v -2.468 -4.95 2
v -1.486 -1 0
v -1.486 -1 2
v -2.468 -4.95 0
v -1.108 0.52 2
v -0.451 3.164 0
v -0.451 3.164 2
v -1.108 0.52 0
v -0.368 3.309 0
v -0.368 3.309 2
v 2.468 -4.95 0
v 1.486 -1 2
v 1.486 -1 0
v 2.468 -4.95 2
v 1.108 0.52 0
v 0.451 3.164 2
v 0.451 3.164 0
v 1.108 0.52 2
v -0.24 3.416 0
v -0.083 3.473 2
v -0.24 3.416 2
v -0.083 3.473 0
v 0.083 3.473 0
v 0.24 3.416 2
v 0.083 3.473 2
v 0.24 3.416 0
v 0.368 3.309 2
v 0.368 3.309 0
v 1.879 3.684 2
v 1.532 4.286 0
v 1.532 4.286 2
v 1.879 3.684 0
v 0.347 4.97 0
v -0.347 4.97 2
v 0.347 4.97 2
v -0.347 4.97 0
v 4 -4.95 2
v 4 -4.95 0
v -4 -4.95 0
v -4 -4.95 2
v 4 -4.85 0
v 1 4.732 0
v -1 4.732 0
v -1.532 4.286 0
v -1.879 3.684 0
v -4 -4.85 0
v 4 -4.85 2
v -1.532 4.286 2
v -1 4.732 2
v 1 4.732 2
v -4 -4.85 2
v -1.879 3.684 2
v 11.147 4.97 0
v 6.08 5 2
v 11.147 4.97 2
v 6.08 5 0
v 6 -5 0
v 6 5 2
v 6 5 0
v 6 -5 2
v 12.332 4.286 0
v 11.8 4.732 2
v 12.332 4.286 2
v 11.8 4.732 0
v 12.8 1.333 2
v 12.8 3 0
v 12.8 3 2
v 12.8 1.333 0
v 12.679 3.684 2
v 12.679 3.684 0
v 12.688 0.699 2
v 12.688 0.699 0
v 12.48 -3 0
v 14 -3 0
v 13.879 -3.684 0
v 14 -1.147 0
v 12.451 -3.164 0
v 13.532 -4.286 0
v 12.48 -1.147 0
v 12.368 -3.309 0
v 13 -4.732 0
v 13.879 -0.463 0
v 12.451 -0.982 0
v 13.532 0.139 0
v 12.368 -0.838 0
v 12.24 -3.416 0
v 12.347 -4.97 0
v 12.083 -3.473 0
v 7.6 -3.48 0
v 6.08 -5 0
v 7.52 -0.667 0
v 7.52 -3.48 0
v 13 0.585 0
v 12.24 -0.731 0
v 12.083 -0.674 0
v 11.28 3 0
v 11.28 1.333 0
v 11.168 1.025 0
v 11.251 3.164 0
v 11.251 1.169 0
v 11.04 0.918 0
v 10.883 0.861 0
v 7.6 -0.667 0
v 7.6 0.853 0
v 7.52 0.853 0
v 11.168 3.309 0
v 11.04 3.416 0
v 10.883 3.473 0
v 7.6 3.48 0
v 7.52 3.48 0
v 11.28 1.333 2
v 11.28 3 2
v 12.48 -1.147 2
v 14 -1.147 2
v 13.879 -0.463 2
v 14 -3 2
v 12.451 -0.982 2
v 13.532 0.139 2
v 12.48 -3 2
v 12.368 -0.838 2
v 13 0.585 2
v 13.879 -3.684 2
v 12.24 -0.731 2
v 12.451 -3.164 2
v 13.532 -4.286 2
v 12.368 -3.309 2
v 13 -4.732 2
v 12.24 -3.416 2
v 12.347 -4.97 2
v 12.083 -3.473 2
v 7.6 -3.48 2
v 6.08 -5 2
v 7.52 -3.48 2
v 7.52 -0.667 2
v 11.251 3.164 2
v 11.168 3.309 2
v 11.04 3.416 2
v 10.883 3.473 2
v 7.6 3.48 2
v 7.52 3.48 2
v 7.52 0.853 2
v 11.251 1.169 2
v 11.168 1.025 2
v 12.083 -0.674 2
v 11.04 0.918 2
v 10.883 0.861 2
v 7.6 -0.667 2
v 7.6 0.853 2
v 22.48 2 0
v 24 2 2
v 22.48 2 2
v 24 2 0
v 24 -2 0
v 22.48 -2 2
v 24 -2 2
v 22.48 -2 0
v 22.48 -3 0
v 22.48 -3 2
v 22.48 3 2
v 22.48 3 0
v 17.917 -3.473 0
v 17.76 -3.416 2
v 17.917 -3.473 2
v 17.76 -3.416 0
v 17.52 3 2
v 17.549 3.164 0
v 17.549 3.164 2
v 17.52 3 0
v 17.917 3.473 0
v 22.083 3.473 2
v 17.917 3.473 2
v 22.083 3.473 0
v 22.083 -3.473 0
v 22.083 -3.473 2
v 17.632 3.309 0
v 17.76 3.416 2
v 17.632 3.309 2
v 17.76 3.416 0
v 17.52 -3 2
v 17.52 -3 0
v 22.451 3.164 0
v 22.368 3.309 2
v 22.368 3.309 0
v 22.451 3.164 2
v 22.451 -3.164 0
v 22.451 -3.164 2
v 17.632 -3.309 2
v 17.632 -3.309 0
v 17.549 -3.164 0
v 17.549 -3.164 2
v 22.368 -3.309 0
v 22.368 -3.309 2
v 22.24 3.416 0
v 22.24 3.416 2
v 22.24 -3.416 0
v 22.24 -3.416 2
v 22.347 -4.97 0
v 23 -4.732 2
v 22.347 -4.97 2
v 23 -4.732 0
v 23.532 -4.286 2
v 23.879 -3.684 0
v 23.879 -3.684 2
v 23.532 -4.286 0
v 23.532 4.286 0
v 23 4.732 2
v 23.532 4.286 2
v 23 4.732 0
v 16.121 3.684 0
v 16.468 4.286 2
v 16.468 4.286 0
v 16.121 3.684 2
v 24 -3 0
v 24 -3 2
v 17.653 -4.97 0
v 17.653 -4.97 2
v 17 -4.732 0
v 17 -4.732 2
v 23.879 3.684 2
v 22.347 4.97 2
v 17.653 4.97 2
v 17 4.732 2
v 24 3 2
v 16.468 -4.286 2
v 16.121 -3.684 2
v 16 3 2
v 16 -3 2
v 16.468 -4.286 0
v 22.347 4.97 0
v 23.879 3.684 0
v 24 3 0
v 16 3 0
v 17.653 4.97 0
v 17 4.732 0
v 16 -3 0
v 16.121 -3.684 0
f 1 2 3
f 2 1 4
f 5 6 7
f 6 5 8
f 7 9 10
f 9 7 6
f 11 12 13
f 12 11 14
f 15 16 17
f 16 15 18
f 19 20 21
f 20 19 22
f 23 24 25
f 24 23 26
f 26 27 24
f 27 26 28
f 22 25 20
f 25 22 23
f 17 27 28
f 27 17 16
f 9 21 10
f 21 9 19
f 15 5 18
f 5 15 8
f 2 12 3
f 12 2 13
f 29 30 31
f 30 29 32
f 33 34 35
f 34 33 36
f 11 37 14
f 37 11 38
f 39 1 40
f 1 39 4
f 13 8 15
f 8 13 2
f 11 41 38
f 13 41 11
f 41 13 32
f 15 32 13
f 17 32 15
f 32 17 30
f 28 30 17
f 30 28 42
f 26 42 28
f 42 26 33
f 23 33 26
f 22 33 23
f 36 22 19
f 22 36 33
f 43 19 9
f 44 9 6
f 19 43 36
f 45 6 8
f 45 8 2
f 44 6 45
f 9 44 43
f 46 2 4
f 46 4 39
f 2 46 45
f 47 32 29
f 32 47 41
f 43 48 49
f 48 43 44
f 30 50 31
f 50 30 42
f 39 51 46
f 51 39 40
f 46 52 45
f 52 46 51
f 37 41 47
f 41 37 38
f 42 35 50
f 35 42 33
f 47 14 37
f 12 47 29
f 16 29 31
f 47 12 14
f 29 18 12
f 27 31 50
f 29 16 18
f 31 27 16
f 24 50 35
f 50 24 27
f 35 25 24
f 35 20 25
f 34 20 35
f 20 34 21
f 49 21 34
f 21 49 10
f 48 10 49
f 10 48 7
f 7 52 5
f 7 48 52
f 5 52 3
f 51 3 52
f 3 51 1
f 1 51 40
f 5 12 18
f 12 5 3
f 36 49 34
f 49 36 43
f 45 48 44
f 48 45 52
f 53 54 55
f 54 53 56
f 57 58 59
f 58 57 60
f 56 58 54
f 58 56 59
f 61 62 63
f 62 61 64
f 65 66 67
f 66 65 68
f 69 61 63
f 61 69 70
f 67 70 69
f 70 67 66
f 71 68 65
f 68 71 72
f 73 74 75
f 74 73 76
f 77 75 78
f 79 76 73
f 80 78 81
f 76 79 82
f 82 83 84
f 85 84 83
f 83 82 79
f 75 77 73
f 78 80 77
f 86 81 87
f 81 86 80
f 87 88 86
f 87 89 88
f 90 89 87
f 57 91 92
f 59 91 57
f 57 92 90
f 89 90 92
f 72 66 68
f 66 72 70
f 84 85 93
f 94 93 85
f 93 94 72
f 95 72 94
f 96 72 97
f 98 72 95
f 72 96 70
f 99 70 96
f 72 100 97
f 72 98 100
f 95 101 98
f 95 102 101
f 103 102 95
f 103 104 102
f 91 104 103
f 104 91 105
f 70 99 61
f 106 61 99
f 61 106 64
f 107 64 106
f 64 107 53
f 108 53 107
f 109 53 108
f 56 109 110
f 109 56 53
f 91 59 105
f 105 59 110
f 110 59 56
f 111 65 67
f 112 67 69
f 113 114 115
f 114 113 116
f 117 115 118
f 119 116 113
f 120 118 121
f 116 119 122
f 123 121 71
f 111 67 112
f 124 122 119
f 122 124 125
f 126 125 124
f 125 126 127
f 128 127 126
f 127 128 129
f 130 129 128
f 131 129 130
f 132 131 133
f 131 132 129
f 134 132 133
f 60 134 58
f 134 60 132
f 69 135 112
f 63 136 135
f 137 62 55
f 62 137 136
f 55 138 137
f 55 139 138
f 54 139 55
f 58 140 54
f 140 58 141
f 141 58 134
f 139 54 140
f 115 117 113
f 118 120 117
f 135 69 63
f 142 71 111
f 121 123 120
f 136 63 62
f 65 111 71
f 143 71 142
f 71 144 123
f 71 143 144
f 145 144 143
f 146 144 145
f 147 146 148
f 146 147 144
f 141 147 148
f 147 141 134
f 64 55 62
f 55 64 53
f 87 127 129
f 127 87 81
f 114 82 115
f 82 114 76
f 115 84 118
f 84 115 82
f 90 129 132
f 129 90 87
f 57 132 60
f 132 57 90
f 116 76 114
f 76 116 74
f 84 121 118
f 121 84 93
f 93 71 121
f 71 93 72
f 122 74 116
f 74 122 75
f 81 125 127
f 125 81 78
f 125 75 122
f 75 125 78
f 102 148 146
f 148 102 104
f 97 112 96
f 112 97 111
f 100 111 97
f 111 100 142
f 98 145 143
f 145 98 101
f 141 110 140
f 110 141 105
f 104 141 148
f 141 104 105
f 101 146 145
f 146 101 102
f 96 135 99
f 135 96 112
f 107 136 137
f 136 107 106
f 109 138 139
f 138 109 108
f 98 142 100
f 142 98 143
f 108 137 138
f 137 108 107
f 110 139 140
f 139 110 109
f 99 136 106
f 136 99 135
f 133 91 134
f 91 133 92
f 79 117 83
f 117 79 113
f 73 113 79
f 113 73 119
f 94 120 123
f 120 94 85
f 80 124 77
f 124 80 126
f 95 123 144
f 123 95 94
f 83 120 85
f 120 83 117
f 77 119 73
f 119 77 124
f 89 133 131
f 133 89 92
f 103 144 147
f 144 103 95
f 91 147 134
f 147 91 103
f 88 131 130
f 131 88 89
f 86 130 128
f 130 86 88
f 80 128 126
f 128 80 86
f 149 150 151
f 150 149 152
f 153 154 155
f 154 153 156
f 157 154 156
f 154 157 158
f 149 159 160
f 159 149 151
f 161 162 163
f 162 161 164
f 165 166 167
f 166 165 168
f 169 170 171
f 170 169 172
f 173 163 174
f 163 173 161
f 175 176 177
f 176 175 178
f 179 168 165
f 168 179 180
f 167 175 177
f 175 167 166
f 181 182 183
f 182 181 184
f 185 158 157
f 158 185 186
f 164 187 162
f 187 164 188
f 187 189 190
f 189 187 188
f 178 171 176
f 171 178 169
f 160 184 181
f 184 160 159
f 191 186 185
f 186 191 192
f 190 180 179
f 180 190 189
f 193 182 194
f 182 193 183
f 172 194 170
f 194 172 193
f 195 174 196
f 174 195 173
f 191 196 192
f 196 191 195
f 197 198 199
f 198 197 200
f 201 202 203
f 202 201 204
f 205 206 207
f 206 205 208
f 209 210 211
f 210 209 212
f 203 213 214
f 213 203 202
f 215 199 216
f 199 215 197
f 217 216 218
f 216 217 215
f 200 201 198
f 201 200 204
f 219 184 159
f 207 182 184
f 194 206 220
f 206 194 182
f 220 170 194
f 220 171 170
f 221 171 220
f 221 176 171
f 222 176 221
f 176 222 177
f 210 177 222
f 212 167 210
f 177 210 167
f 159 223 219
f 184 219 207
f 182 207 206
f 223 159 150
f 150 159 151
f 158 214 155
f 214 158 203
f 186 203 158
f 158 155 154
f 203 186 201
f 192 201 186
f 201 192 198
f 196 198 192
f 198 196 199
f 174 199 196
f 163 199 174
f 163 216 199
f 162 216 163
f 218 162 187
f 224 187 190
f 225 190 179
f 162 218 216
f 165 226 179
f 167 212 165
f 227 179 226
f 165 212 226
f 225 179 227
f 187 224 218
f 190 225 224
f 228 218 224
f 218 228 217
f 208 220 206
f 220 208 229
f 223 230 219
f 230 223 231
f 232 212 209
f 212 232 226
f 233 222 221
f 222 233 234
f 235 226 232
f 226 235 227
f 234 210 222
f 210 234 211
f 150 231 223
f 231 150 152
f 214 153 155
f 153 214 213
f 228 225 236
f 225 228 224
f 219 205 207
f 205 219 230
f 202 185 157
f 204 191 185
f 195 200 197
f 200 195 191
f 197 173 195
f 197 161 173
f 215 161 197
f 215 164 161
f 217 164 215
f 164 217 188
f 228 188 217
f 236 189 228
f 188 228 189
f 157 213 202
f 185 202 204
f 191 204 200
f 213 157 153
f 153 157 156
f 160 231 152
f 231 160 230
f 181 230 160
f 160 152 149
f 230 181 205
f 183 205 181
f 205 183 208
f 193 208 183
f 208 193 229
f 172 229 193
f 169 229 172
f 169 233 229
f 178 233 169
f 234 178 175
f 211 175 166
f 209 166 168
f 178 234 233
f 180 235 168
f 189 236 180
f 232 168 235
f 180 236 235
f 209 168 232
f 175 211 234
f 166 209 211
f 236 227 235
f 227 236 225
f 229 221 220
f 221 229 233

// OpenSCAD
/*    
parametric round font  - PRF
Copyright (C) 2013  Michał Liberda (yru)


    This program is free software: you can redistribute it and/or modify
    it under the terms of the GNU General Public License as published by
    the Free Software Foundation, either version 3 of the License, or
    (at your option) any later version.

    This program is distributed in the hope that it will be useful,
    but WITHOUT ANY WARRANTY; without even the implied warranty of
    MERCHANTABILITY or FITNESS FOR A PARTICULAR PURPOSE.  See the
    GNU General Public License for more details.

    You should have received a copy of the GNU General Public License
    along with this program.  If not, see <http://www.gnu.org/licenses/>.

contact me on zephyru.com or yru@o2.pl
see videos on yru2501 yt channel
*/

// preview[view:south, tilt:top]

//roundess to width heigth
lr=40;//[10:50]
//width in percent of heigth
whratio=80;//[10:300]
//point sharpness ratio
psn=0;//[0:100]
//middle point height ratio
mph=40;//[10:60]
//cutout ratio
ctr=30;//[10:80]
//finish quality - roundness n/o faces
sths=18; //[6:50]
//depth
dpt=2;
fsz=10/1;
//preview spacing
psc=10;

yan_A(lh=fsz,lst=sths,ld=dpt,ptn=psn/100,mpha=mph/100,ctra=(lr/100)*ctr/50,lrr=lr/100,wr=whratio/100);
translate([psc,0,0]) yan_B(lh=fsz,lst=sths,ld=dpt,ptn=psn/100,mpha=mph/300+.3,ctra=(lr/100)*ctr/50,lrr=lr/100,wr=whratio/100);
translate([psc*2,0,0]) yan_C(lh=fsz,lst=sths,ld=dpt,ptn=psn/100,mpha=mph/100,ctra=(lr/100)*ctr/50,lrr=lr/100,wr=whratio/100);



module yan_C(wr=0.6,lh=10,lrr=0.2,lst=7,ptn=0.3,mpha=0.5,ctra=0.2,ld=2){
lri=lh*lrr;
lw=lh*wr;
vsp=lh-lri;
hsp=(lw-lri)/2;
vspB=lh;
lwc=lw-(lri*(1-ctra));


vsAu=vsp/2;
vsAl=lh/2-lh*(1-mpha)+lri/2;
vsBu=lh/2-lh*(1-mpha);
vsBl=-vsp/2;


//%translate([-lw/2,vsAu,0]) cube([lw,vsAu*2,1]);

difference(){
union(){
hull(){
translate([hsp,vsAu,0]) cylinder(r=lri/2,h=ld,$fn=lst);
translate([hsp,vsBl,0]) cylinder(r=lri/2,h=ld,$fn=lst);
translate([-hsp,vsAu,0]) cylinder(r=lri/2,h=ld,$fn=lst);
translate([-hsp,vsBl,0]) cylinder(r=lri/2,h=ld,$fn=lst);
}


} 

difference(){
union(){
translate([0,-lh*(mpha)/2,-.1]) cube([lw,lh*(mpha),ld+1]);
hull(){
translate([hsp,vsAu,-.1]) cylinder(r=lri/2*ctra,h=ld+1,$fn=lst);
translate([hsp,vsBl,-.1]) cylinder(r=lri/2*ctra,h=ld+1,$fn=lst);
translate([-hsp,vsAu,-.1]) cylinder(r=lri/2*ctra,h=ld+1,$fn=lst);
translate([-hsp,vsBl,-.1]) cylinder(r=lri/2*ctra,h=ld+1,$fn=lst);
}
}
}
}
}


module yan_B(wr=0.6,lh=10,lrr=0.2,lst=7,ptn=0.3,mpha=0.5,ctra=0.2,ld=2){
lri=lh*lrr;
lw=lh*wr;
vsp=lh-lri;
hsp=(lw-lri)/2;
vspB=lh;
lwc=lw-(lri*(1-ctra));
barh=((lri*(1-ctra))/2);

vsAu=vsp/2;
vsAl=lh/2-lh*(1-mpha)+barh+(lri/2)*(ctra);
vsBu=lh/2-lh*(1-mpha)-(lri/2)*(ctra);
vsBl=-vsp/2;


//%translate([-lw/2,vsAu,0]) cube([lw,vsAu*2,1]);

difference(){
union(){
hull(){
translate([hsp*(ptn*0.6+0.4),vsAu,0]) cylinder(r=lri/2,h=ld,$fn=lst);
translate([hsp*(ptn*0.6+0.4),vsAl,0]) cylinder(r=lri/2,h=ld,$fn=lst);
translate([-lw/2,lh/2-lh*(1-mpha),0]) cube([lw/100,lh*(1-mpha),ld]);
}

hull(){
translate([hsp,vsBl,0]) cylinder(r=lri/2,h=ld,$fn=lst);
translate([hsp,vsBu,0]) cylinder(r=lri/2,h=ld,$fn=lst);
translate([-lw/2,-lh/2,0]) cube([lw/100,lh*(mpha),ld]);
}

} 

difference(){
union(){
hull(){
translate([hsp*(ptn*0.6+0.4),vsAu,-.5]) cylinder(r=(lri/2)*ctra,h=ld+1,$fn=lst);
translate([hsp*(ptn*0.6+0.4),vsAl,-.5]) cylinder(r=(lri/2)*ctra,h=ld+1,$fn=lst);
translate([-lw/2+((lri/2)*(1-ctra)),-(vsAu-vsAl+lri*ctra)/2+vsAu/2+vsAl/2,0]) cube([lw/100,(vsAu-vsAl+lri*ctra),ld]);
}
hull(){
translate([hsp,vsBu,-.5]) cylinder(r=(lri/2)*ctra,h=ld+1,$fn=lst);
translate([hsp,vsBl,-.5]) cylinder(r=(lri/2)*ctra,h=ld+1,$fn=lst);
translate([-lw/2+((lri/2)*(1-ctra)),-(vsBu-vsBl+lri*ctra)/2+vsBu/2+vsBl/2,0]) cube([lw/100,(vsBu-vsBl+lri*ctra),ld]);
}
}
}
}
}


module yan_A(wr=0.6,lh=10,lrr=0.2,lst=7,ptn=0.3,mpha=0.5,ctra=0.2,ld=2){
lri=lh*lrr;
lw=lh*wr;
vsp=lh-lri;
hsp=(lw-lri)/2;
vspB=lh;
lwc=lw-(lri*(1-ctra));

difference(){
union(){
hull(){
for(i=[1,-1]){
translate([i*hsp*ptn,vsp/2,0]) cylinder(r=lri/2,h=ld,$fn=lst);
}
translate([-lw/2,-lh*.495,0]) cube([lw,lh/100,ld]);
}
} 

difference(){
hull()
for(i=[1,-1]){
translate([i*hsp*ptn,vsp/2,-.05]) cylinder(r=(lri/2)*ctra,h=ld+.1,$fn=lst);
translate([-lwc/2,-lh*.495-0.15,0]) cube([lwc,lh/100,ld]);
}
translate([-lw/2,-lh*(.495-mpha)-0.05,-1]) cube([lw,(lri*(1-ctra))/2,ld+2]);
}

}}
